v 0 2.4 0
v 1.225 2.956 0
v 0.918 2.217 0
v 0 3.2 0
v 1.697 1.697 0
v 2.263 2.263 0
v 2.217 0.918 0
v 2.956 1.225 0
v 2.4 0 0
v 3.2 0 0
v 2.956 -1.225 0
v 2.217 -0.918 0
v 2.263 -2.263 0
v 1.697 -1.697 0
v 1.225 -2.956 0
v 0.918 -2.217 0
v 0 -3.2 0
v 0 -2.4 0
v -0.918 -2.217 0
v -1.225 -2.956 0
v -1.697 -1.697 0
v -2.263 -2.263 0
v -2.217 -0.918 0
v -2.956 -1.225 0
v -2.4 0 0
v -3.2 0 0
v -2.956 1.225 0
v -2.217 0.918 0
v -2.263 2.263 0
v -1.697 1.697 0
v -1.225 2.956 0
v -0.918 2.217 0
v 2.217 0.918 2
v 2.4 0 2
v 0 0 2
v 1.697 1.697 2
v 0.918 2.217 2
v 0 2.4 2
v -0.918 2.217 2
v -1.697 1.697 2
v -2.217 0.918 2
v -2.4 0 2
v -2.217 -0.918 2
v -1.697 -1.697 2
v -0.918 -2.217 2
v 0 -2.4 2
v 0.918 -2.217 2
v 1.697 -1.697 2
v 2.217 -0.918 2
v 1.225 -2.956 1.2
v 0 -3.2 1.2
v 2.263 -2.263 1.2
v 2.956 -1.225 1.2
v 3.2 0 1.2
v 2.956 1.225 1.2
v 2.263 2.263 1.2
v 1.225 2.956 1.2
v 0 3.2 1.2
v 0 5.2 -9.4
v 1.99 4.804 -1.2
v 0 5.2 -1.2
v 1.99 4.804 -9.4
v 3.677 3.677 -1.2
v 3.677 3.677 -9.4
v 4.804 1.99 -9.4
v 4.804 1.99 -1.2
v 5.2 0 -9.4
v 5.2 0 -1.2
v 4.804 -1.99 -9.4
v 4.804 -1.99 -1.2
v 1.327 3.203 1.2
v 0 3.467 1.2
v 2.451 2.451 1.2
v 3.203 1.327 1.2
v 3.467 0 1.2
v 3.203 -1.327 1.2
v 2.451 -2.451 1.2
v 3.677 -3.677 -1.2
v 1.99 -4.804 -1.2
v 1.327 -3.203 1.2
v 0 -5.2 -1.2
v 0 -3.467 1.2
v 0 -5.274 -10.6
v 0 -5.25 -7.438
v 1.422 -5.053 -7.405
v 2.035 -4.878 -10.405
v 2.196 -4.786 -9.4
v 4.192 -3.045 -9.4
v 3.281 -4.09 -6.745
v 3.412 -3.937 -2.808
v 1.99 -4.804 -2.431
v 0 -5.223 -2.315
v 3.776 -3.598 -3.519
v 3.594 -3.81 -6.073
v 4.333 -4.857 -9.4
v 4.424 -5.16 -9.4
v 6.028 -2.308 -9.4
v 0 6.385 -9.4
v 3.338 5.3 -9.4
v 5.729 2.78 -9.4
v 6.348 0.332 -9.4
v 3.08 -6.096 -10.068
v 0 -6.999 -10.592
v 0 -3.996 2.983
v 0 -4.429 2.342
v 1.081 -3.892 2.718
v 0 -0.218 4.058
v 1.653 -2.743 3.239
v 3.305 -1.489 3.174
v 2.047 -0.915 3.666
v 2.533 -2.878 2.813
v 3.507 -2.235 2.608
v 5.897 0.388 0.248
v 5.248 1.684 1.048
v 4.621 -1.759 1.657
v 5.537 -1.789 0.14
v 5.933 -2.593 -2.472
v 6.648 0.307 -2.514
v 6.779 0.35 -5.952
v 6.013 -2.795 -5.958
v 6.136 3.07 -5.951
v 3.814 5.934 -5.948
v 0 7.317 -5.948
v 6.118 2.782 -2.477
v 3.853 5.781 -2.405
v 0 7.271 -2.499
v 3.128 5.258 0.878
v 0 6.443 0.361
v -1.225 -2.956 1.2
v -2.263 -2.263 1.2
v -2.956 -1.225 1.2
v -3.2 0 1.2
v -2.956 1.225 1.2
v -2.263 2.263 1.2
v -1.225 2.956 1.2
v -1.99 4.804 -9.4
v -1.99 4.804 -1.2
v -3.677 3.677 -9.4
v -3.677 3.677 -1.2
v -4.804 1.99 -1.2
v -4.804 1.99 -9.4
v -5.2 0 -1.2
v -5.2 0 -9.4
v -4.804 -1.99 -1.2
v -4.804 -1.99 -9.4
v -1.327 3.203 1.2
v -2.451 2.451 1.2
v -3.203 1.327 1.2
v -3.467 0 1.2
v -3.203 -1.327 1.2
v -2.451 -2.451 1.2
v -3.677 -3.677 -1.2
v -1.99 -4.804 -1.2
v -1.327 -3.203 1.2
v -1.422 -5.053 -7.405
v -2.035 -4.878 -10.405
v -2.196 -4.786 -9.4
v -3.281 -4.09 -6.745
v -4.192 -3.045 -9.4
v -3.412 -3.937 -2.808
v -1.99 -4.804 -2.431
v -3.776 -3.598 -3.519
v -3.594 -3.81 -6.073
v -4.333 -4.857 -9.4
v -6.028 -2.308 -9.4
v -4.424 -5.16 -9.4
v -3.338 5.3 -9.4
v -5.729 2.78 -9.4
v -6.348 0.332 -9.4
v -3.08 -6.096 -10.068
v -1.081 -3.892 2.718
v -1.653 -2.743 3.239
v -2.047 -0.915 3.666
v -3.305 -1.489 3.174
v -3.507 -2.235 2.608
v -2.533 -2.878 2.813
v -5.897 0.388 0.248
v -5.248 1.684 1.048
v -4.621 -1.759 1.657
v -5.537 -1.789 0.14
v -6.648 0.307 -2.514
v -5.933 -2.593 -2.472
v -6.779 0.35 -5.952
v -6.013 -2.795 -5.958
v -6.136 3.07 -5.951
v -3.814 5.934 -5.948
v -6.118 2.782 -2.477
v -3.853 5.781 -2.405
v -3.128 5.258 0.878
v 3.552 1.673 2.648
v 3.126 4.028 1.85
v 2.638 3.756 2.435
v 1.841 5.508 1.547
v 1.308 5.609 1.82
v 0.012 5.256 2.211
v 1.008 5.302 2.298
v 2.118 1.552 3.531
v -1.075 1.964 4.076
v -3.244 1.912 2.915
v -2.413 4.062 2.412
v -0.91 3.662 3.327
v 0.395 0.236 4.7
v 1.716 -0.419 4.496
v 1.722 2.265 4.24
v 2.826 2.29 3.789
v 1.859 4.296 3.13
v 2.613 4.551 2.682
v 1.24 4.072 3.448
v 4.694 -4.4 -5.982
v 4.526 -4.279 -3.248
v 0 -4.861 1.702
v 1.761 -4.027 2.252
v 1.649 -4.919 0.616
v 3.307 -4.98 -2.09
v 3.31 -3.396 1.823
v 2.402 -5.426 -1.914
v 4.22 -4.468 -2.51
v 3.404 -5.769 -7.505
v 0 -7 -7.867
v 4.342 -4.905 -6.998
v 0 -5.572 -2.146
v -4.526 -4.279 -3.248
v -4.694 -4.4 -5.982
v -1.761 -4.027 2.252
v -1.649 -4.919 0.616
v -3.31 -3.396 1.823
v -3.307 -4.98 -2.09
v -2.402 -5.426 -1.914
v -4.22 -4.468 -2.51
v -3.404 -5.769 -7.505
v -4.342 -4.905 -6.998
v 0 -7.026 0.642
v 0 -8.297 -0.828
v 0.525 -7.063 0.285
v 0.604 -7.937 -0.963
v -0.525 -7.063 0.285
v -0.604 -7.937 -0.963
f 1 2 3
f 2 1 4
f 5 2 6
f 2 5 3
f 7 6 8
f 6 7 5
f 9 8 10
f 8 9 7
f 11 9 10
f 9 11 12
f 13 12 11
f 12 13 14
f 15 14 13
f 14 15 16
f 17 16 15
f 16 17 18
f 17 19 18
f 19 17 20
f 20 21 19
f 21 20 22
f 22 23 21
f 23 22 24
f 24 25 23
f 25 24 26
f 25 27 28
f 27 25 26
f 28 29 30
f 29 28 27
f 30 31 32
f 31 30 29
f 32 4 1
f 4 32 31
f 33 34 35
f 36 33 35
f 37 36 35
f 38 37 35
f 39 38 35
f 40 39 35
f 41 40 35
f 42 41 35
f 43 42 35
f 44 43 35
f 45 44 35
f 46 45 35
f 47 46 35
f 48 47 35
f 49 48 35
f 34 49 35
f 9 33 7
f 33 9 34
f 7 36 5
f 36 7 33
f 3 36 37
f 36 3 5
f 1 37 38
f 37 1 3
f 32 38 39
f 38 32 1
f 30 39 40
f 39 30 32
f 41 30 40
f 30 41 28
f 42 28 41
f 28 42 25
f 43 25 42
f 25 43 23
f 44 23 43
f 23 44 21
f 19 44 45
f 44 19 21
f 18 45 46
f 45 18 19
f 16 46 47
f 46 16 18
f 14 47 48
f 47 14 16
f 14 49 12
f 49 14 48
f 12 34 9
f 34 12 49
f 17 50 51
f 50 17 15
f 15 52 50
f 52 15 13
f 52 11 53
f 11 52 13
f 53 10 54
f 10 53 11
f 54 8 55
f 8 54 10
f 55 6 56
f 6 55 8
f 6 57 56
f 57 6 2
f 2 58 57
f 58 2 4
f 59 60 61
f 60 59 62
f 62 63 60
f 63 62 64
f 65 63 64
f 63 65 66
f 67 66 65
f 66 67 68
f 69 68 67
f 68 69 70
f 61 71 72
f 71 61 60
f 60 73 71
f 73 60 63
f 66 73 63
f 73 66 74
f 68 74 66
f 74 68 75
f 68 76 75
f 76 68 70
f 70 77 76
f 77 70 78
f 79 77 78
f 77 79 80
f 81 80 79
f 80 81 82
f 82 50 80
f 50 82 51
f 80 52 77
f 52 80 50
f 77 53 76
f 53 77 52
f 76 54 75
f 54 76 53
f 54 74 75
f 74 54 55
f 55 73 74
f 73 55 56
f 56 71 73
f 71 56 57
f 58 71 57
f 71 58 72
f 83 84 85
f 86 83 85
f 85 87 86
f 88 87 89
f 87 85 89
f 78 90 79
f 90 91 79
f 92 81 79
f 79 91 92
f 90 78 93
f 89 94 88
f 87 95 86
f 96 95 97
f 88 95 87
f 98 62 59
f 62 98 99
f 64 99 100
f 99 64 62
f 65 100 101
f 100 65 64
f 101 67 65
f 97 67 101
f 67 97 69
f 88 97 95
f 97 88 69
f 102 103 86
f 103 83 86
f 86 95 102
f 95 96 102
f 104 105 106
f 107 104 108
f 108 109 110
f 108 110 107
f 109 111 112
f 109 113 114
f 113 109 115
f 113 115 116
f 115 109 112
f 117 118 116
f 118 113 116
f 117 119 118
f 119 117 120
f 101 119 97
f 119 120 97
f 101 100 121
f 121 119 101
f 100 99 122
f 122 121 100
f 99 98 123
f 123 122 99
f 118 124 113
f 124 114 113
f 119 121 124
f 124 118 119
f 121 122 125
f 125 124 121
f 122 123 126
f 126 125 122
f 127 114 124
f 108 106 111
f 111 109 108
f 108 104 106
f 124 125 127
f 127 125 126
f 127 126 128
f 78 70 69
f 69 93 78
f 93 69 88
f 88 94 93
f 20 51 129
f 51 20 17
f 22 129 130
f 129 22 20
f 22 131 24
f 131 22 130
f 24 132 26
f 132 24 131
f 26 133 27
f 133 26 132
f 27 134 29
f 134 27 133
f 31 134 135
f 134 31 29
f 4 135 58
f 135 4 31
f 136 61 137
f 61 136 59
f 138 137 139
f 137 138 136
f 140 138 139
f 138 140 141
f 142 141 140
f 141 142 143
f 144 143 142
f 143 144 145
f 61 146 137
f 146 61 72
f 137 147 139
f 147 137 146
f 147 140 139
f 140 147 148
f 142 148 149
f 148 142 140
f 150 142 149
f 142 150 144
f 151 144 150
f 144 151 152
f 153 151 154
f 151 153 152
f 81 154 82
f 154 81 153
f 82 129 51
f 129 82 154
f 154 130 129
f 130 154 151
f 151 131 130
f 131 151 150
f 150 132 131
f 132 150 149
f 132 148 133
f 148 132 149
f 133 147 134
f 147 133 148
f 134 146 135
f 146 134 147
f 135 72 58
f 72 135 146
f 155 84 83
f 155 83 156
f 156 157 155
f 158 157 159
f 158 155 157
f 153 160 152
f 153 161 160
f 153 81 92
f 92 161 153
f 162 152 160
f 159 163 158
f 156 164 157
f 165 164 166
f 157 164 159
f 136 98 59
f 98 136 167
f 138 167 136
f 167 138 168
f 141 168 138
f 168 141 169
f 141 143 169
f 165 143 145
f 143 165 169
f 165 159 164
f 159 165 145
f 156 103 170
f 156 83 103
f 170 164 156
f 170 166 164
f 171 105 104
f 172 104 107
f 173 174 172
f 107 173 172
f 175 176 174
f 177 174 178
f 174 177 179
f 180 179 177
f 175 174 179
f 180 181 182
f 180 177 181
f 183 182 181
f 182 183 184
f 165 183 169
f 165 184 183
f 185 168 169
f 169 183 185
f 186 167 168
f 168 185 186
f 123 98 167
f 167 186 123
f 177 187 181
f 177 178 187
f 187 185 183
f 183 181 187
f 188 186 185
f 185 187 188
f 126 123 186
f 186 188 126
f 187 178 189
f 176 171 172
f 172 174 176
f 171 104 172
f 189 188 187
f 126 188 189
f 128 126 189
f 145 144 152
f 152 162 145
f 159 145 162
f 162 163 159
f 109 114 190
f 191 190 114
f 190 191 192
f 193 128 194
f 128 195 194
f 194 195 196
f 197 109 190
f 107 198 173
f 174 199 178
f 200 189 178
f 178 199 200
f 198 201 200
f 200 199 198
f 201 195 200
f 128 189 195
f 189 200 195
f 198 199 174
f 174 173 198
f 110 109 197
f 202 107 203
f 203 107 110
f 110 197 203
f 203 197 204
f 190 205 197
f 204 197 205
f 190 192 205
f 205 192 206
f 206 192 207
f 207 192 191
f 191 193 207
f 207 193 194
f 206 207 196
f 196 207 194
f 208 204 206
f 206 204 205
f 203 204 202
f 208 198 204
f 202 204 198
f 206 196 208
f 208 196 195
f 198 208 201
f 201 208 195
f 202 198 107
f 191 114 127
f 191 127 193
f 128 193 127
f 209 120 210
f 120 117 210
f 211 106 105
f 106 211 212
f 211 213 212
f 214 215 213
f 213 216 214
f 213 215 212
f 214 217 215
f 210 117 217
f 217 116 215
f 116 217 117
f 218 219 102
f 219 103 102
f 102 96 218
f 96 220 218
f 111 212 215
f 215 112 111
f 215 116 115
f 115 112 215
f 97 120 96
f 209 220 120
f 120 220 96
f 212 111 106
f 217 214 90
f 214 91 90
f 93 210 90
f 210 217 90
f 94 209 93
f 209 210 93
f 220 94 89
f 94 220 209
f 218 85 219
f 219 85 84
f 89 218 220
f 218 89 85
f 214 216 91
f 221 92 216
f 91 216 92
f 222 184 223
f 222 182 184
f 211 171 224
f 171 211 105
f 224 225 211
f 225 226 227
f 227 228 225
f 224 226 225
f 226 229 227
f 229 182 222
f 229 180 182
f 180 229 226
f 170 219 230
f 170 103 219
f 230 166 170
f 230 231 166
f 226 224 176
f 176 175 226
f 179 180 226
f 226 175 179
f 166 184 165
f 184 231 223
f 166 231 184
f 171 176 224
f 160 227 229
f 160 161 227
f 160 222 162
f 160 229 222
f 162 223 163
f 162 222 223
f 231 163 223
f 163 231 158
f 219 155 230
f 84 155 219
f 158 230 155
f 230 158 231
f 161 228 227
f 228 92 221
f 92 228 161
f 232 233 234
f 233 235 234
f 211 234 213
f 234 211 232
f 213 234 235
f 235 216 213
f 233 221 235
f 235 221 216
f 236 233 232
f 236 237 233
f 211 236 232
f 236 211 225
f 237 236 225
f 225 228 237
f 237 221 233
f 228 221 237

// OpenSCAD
use <../lib.scad>
use <s/25971s01.scad>
use <s/25971s02.scad>
use <s/25971s03.scad>
use <s/25971s04.scad>
use <../p/stud4o.scad>
$fa=1; $fs=0.2;
function ldraw_lib__25971(realsolid=false) = [
// 0 Minifig Headdress Bird
// 0 Name: 25971.dat
// 0 Author: Philippe Hurbain [Philo]
// 0 !LDRAW_ORG Part UPDATE 2020-01
// 0 !LICENSE Licensed under CC BY 2.0 and CC BY 4.0 : see CAreadme.txt
// 
// 0 BFC CERTIFY CCW
  [0,"BFC","CERTIFY"],
  [0,"BFC","CCW"],
// 
// 0 !CATEGORY Minifig Headwear
// 
// 0 !HISTORY 2016-10-05 {LEGO Digital Designer} Original part shape
// 0 !HISTORY 2019-05-19 [Philo] File preparation for LDraw Parts Tracker
// 0 !HISTORY 2020-06-28 [PTadmin] Official Update 2020-01
// 
// 
// 1 16 0 -5 0 -1 0 0 0 -1.25 0 0 0 1 stud4o.dat
  [1,16,0,-5,0,-1,0,0,0,-1.25,0,0,0,1, ldraw_lib__stud4o(realsolid)],
// 1 16 0 0 0 1 0 0 0 1 0 0 0 1 s\25971s01.dat
  [1,16,0,0,0,1,0,0,0,1,0,0,0,1, ldraw_lib__s__25971s01(realsolid)],
// 1 16 0 0 0 -1 0 0 0 1 0 0 0 1 s\25971s01.dat
  [1,16,0,0,0,-1,0,0,0,1,0,0,0,1, ldraw_lib__s__25971s01(realsolid)],
// 1 16 0 0 0 1 0 0 0 1 0 0 0 1 s\25971s02.dat
  [1,16,0,0,0,1,0,0,0,1,0,0,0,1, ldraw_lib__s__25971s02(realsolid)],
// 1 16 0 0 0 1 0 0 0 1 0 0 0 1 s\25971s03.dat
  [1,16,0,0,0,1,0,0,0,1,0,0,0,1, ldraw_lib__s__25971s03(realsolid)],
// 1 16 0 0 0 -1 0 0 0 1 0 0 0 1 s\25971s03.dat
  [1,16,0,0,0,-1,0,0,0,1,0,0,0,1, ldraw_lib__s__25971s03(realsolid)],
// 1 16 0 0 0 1 0 0 0 1 0 0 0 1 s\25971s04.dat
  [1,16,0,0,0,1,0,0,0,1,0,0,0,1, ldraw_lib__s__25971s04(realsolid)],
// 1 16 0 0 0 -1 0 0 0 1 0 0 0 1 s\25971s04.dat
  [1,16,0,0,0,-1,0,0,0,1,0,0,0,1, ldraw_lib__s__25971s04(realsolid)],
];
module ldraw_lib__25971(step=0, col=false, unit=2/5, alt=false, line=0.2, solid=!$preview)
    makepoly(ldraw_lib__25971(solid), step=step, col=col, unit=unit, alt=alt, line=line, solid=solid);
ldraw_lib__25971(line=0.2);
